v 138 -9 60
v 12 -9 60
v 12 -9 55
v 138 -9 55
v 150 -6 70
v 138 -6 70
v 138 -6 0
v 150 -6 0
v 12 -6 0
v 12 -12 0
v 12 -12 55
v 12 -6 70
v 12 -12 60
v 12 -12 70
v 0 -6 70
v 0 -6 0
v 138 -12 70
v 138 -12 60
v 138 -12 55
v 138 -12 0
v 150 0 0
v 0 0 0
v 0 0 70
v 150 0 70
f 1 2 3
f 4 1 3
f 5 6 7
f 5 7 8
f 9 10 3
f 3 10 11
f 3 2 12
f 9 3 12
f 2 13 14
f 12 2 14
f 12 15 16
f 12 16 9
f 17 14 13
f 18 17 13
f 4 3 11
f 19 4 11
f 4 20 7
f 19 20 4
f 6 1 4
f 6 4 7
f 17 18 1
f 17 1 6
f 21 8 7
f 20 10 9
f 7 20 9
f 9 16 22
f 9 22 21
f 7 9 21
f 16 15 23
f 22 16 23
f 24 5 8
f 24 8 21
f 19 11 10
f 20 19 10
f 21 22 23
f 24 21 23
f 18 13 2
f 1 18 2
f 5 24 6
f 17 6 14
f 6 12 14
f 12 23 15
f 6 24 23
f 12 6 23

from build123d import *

# Parameters (mm, degrees)
F1_DEPTH = 150
F2_W     = 12
F2_H     = 70
F3_DEPTH = 6


# Not quite as in the source:
# - a feature names something its author has since deleted; it is built from what else it names


with BuildPart() as f1:
    # F0 (on Right) → F1 (new body)
    with BuildSketch(Plane.YZ):
        Polygon((-12, 0), (0, 0), (0, 70), (-12, 70), (-12, 60), (-9, 60), (-9, 55), (-12, 55), align=None)
    extrude(amount=F1_DEPTH)

    # F2 (on face) → F3 (cut)
    with BuildSketch(Plane.XZ.offset(12)):
        with Locations((144, 35)):
            Rectangle(F2_W, F2_H)
        with Locations((6, 35)):
            Rectangle(F2_W, F2_H)
    extrude(amount=-F3_DEPTH, mode=Mode.SUBTRACT)


solid = f1.part
